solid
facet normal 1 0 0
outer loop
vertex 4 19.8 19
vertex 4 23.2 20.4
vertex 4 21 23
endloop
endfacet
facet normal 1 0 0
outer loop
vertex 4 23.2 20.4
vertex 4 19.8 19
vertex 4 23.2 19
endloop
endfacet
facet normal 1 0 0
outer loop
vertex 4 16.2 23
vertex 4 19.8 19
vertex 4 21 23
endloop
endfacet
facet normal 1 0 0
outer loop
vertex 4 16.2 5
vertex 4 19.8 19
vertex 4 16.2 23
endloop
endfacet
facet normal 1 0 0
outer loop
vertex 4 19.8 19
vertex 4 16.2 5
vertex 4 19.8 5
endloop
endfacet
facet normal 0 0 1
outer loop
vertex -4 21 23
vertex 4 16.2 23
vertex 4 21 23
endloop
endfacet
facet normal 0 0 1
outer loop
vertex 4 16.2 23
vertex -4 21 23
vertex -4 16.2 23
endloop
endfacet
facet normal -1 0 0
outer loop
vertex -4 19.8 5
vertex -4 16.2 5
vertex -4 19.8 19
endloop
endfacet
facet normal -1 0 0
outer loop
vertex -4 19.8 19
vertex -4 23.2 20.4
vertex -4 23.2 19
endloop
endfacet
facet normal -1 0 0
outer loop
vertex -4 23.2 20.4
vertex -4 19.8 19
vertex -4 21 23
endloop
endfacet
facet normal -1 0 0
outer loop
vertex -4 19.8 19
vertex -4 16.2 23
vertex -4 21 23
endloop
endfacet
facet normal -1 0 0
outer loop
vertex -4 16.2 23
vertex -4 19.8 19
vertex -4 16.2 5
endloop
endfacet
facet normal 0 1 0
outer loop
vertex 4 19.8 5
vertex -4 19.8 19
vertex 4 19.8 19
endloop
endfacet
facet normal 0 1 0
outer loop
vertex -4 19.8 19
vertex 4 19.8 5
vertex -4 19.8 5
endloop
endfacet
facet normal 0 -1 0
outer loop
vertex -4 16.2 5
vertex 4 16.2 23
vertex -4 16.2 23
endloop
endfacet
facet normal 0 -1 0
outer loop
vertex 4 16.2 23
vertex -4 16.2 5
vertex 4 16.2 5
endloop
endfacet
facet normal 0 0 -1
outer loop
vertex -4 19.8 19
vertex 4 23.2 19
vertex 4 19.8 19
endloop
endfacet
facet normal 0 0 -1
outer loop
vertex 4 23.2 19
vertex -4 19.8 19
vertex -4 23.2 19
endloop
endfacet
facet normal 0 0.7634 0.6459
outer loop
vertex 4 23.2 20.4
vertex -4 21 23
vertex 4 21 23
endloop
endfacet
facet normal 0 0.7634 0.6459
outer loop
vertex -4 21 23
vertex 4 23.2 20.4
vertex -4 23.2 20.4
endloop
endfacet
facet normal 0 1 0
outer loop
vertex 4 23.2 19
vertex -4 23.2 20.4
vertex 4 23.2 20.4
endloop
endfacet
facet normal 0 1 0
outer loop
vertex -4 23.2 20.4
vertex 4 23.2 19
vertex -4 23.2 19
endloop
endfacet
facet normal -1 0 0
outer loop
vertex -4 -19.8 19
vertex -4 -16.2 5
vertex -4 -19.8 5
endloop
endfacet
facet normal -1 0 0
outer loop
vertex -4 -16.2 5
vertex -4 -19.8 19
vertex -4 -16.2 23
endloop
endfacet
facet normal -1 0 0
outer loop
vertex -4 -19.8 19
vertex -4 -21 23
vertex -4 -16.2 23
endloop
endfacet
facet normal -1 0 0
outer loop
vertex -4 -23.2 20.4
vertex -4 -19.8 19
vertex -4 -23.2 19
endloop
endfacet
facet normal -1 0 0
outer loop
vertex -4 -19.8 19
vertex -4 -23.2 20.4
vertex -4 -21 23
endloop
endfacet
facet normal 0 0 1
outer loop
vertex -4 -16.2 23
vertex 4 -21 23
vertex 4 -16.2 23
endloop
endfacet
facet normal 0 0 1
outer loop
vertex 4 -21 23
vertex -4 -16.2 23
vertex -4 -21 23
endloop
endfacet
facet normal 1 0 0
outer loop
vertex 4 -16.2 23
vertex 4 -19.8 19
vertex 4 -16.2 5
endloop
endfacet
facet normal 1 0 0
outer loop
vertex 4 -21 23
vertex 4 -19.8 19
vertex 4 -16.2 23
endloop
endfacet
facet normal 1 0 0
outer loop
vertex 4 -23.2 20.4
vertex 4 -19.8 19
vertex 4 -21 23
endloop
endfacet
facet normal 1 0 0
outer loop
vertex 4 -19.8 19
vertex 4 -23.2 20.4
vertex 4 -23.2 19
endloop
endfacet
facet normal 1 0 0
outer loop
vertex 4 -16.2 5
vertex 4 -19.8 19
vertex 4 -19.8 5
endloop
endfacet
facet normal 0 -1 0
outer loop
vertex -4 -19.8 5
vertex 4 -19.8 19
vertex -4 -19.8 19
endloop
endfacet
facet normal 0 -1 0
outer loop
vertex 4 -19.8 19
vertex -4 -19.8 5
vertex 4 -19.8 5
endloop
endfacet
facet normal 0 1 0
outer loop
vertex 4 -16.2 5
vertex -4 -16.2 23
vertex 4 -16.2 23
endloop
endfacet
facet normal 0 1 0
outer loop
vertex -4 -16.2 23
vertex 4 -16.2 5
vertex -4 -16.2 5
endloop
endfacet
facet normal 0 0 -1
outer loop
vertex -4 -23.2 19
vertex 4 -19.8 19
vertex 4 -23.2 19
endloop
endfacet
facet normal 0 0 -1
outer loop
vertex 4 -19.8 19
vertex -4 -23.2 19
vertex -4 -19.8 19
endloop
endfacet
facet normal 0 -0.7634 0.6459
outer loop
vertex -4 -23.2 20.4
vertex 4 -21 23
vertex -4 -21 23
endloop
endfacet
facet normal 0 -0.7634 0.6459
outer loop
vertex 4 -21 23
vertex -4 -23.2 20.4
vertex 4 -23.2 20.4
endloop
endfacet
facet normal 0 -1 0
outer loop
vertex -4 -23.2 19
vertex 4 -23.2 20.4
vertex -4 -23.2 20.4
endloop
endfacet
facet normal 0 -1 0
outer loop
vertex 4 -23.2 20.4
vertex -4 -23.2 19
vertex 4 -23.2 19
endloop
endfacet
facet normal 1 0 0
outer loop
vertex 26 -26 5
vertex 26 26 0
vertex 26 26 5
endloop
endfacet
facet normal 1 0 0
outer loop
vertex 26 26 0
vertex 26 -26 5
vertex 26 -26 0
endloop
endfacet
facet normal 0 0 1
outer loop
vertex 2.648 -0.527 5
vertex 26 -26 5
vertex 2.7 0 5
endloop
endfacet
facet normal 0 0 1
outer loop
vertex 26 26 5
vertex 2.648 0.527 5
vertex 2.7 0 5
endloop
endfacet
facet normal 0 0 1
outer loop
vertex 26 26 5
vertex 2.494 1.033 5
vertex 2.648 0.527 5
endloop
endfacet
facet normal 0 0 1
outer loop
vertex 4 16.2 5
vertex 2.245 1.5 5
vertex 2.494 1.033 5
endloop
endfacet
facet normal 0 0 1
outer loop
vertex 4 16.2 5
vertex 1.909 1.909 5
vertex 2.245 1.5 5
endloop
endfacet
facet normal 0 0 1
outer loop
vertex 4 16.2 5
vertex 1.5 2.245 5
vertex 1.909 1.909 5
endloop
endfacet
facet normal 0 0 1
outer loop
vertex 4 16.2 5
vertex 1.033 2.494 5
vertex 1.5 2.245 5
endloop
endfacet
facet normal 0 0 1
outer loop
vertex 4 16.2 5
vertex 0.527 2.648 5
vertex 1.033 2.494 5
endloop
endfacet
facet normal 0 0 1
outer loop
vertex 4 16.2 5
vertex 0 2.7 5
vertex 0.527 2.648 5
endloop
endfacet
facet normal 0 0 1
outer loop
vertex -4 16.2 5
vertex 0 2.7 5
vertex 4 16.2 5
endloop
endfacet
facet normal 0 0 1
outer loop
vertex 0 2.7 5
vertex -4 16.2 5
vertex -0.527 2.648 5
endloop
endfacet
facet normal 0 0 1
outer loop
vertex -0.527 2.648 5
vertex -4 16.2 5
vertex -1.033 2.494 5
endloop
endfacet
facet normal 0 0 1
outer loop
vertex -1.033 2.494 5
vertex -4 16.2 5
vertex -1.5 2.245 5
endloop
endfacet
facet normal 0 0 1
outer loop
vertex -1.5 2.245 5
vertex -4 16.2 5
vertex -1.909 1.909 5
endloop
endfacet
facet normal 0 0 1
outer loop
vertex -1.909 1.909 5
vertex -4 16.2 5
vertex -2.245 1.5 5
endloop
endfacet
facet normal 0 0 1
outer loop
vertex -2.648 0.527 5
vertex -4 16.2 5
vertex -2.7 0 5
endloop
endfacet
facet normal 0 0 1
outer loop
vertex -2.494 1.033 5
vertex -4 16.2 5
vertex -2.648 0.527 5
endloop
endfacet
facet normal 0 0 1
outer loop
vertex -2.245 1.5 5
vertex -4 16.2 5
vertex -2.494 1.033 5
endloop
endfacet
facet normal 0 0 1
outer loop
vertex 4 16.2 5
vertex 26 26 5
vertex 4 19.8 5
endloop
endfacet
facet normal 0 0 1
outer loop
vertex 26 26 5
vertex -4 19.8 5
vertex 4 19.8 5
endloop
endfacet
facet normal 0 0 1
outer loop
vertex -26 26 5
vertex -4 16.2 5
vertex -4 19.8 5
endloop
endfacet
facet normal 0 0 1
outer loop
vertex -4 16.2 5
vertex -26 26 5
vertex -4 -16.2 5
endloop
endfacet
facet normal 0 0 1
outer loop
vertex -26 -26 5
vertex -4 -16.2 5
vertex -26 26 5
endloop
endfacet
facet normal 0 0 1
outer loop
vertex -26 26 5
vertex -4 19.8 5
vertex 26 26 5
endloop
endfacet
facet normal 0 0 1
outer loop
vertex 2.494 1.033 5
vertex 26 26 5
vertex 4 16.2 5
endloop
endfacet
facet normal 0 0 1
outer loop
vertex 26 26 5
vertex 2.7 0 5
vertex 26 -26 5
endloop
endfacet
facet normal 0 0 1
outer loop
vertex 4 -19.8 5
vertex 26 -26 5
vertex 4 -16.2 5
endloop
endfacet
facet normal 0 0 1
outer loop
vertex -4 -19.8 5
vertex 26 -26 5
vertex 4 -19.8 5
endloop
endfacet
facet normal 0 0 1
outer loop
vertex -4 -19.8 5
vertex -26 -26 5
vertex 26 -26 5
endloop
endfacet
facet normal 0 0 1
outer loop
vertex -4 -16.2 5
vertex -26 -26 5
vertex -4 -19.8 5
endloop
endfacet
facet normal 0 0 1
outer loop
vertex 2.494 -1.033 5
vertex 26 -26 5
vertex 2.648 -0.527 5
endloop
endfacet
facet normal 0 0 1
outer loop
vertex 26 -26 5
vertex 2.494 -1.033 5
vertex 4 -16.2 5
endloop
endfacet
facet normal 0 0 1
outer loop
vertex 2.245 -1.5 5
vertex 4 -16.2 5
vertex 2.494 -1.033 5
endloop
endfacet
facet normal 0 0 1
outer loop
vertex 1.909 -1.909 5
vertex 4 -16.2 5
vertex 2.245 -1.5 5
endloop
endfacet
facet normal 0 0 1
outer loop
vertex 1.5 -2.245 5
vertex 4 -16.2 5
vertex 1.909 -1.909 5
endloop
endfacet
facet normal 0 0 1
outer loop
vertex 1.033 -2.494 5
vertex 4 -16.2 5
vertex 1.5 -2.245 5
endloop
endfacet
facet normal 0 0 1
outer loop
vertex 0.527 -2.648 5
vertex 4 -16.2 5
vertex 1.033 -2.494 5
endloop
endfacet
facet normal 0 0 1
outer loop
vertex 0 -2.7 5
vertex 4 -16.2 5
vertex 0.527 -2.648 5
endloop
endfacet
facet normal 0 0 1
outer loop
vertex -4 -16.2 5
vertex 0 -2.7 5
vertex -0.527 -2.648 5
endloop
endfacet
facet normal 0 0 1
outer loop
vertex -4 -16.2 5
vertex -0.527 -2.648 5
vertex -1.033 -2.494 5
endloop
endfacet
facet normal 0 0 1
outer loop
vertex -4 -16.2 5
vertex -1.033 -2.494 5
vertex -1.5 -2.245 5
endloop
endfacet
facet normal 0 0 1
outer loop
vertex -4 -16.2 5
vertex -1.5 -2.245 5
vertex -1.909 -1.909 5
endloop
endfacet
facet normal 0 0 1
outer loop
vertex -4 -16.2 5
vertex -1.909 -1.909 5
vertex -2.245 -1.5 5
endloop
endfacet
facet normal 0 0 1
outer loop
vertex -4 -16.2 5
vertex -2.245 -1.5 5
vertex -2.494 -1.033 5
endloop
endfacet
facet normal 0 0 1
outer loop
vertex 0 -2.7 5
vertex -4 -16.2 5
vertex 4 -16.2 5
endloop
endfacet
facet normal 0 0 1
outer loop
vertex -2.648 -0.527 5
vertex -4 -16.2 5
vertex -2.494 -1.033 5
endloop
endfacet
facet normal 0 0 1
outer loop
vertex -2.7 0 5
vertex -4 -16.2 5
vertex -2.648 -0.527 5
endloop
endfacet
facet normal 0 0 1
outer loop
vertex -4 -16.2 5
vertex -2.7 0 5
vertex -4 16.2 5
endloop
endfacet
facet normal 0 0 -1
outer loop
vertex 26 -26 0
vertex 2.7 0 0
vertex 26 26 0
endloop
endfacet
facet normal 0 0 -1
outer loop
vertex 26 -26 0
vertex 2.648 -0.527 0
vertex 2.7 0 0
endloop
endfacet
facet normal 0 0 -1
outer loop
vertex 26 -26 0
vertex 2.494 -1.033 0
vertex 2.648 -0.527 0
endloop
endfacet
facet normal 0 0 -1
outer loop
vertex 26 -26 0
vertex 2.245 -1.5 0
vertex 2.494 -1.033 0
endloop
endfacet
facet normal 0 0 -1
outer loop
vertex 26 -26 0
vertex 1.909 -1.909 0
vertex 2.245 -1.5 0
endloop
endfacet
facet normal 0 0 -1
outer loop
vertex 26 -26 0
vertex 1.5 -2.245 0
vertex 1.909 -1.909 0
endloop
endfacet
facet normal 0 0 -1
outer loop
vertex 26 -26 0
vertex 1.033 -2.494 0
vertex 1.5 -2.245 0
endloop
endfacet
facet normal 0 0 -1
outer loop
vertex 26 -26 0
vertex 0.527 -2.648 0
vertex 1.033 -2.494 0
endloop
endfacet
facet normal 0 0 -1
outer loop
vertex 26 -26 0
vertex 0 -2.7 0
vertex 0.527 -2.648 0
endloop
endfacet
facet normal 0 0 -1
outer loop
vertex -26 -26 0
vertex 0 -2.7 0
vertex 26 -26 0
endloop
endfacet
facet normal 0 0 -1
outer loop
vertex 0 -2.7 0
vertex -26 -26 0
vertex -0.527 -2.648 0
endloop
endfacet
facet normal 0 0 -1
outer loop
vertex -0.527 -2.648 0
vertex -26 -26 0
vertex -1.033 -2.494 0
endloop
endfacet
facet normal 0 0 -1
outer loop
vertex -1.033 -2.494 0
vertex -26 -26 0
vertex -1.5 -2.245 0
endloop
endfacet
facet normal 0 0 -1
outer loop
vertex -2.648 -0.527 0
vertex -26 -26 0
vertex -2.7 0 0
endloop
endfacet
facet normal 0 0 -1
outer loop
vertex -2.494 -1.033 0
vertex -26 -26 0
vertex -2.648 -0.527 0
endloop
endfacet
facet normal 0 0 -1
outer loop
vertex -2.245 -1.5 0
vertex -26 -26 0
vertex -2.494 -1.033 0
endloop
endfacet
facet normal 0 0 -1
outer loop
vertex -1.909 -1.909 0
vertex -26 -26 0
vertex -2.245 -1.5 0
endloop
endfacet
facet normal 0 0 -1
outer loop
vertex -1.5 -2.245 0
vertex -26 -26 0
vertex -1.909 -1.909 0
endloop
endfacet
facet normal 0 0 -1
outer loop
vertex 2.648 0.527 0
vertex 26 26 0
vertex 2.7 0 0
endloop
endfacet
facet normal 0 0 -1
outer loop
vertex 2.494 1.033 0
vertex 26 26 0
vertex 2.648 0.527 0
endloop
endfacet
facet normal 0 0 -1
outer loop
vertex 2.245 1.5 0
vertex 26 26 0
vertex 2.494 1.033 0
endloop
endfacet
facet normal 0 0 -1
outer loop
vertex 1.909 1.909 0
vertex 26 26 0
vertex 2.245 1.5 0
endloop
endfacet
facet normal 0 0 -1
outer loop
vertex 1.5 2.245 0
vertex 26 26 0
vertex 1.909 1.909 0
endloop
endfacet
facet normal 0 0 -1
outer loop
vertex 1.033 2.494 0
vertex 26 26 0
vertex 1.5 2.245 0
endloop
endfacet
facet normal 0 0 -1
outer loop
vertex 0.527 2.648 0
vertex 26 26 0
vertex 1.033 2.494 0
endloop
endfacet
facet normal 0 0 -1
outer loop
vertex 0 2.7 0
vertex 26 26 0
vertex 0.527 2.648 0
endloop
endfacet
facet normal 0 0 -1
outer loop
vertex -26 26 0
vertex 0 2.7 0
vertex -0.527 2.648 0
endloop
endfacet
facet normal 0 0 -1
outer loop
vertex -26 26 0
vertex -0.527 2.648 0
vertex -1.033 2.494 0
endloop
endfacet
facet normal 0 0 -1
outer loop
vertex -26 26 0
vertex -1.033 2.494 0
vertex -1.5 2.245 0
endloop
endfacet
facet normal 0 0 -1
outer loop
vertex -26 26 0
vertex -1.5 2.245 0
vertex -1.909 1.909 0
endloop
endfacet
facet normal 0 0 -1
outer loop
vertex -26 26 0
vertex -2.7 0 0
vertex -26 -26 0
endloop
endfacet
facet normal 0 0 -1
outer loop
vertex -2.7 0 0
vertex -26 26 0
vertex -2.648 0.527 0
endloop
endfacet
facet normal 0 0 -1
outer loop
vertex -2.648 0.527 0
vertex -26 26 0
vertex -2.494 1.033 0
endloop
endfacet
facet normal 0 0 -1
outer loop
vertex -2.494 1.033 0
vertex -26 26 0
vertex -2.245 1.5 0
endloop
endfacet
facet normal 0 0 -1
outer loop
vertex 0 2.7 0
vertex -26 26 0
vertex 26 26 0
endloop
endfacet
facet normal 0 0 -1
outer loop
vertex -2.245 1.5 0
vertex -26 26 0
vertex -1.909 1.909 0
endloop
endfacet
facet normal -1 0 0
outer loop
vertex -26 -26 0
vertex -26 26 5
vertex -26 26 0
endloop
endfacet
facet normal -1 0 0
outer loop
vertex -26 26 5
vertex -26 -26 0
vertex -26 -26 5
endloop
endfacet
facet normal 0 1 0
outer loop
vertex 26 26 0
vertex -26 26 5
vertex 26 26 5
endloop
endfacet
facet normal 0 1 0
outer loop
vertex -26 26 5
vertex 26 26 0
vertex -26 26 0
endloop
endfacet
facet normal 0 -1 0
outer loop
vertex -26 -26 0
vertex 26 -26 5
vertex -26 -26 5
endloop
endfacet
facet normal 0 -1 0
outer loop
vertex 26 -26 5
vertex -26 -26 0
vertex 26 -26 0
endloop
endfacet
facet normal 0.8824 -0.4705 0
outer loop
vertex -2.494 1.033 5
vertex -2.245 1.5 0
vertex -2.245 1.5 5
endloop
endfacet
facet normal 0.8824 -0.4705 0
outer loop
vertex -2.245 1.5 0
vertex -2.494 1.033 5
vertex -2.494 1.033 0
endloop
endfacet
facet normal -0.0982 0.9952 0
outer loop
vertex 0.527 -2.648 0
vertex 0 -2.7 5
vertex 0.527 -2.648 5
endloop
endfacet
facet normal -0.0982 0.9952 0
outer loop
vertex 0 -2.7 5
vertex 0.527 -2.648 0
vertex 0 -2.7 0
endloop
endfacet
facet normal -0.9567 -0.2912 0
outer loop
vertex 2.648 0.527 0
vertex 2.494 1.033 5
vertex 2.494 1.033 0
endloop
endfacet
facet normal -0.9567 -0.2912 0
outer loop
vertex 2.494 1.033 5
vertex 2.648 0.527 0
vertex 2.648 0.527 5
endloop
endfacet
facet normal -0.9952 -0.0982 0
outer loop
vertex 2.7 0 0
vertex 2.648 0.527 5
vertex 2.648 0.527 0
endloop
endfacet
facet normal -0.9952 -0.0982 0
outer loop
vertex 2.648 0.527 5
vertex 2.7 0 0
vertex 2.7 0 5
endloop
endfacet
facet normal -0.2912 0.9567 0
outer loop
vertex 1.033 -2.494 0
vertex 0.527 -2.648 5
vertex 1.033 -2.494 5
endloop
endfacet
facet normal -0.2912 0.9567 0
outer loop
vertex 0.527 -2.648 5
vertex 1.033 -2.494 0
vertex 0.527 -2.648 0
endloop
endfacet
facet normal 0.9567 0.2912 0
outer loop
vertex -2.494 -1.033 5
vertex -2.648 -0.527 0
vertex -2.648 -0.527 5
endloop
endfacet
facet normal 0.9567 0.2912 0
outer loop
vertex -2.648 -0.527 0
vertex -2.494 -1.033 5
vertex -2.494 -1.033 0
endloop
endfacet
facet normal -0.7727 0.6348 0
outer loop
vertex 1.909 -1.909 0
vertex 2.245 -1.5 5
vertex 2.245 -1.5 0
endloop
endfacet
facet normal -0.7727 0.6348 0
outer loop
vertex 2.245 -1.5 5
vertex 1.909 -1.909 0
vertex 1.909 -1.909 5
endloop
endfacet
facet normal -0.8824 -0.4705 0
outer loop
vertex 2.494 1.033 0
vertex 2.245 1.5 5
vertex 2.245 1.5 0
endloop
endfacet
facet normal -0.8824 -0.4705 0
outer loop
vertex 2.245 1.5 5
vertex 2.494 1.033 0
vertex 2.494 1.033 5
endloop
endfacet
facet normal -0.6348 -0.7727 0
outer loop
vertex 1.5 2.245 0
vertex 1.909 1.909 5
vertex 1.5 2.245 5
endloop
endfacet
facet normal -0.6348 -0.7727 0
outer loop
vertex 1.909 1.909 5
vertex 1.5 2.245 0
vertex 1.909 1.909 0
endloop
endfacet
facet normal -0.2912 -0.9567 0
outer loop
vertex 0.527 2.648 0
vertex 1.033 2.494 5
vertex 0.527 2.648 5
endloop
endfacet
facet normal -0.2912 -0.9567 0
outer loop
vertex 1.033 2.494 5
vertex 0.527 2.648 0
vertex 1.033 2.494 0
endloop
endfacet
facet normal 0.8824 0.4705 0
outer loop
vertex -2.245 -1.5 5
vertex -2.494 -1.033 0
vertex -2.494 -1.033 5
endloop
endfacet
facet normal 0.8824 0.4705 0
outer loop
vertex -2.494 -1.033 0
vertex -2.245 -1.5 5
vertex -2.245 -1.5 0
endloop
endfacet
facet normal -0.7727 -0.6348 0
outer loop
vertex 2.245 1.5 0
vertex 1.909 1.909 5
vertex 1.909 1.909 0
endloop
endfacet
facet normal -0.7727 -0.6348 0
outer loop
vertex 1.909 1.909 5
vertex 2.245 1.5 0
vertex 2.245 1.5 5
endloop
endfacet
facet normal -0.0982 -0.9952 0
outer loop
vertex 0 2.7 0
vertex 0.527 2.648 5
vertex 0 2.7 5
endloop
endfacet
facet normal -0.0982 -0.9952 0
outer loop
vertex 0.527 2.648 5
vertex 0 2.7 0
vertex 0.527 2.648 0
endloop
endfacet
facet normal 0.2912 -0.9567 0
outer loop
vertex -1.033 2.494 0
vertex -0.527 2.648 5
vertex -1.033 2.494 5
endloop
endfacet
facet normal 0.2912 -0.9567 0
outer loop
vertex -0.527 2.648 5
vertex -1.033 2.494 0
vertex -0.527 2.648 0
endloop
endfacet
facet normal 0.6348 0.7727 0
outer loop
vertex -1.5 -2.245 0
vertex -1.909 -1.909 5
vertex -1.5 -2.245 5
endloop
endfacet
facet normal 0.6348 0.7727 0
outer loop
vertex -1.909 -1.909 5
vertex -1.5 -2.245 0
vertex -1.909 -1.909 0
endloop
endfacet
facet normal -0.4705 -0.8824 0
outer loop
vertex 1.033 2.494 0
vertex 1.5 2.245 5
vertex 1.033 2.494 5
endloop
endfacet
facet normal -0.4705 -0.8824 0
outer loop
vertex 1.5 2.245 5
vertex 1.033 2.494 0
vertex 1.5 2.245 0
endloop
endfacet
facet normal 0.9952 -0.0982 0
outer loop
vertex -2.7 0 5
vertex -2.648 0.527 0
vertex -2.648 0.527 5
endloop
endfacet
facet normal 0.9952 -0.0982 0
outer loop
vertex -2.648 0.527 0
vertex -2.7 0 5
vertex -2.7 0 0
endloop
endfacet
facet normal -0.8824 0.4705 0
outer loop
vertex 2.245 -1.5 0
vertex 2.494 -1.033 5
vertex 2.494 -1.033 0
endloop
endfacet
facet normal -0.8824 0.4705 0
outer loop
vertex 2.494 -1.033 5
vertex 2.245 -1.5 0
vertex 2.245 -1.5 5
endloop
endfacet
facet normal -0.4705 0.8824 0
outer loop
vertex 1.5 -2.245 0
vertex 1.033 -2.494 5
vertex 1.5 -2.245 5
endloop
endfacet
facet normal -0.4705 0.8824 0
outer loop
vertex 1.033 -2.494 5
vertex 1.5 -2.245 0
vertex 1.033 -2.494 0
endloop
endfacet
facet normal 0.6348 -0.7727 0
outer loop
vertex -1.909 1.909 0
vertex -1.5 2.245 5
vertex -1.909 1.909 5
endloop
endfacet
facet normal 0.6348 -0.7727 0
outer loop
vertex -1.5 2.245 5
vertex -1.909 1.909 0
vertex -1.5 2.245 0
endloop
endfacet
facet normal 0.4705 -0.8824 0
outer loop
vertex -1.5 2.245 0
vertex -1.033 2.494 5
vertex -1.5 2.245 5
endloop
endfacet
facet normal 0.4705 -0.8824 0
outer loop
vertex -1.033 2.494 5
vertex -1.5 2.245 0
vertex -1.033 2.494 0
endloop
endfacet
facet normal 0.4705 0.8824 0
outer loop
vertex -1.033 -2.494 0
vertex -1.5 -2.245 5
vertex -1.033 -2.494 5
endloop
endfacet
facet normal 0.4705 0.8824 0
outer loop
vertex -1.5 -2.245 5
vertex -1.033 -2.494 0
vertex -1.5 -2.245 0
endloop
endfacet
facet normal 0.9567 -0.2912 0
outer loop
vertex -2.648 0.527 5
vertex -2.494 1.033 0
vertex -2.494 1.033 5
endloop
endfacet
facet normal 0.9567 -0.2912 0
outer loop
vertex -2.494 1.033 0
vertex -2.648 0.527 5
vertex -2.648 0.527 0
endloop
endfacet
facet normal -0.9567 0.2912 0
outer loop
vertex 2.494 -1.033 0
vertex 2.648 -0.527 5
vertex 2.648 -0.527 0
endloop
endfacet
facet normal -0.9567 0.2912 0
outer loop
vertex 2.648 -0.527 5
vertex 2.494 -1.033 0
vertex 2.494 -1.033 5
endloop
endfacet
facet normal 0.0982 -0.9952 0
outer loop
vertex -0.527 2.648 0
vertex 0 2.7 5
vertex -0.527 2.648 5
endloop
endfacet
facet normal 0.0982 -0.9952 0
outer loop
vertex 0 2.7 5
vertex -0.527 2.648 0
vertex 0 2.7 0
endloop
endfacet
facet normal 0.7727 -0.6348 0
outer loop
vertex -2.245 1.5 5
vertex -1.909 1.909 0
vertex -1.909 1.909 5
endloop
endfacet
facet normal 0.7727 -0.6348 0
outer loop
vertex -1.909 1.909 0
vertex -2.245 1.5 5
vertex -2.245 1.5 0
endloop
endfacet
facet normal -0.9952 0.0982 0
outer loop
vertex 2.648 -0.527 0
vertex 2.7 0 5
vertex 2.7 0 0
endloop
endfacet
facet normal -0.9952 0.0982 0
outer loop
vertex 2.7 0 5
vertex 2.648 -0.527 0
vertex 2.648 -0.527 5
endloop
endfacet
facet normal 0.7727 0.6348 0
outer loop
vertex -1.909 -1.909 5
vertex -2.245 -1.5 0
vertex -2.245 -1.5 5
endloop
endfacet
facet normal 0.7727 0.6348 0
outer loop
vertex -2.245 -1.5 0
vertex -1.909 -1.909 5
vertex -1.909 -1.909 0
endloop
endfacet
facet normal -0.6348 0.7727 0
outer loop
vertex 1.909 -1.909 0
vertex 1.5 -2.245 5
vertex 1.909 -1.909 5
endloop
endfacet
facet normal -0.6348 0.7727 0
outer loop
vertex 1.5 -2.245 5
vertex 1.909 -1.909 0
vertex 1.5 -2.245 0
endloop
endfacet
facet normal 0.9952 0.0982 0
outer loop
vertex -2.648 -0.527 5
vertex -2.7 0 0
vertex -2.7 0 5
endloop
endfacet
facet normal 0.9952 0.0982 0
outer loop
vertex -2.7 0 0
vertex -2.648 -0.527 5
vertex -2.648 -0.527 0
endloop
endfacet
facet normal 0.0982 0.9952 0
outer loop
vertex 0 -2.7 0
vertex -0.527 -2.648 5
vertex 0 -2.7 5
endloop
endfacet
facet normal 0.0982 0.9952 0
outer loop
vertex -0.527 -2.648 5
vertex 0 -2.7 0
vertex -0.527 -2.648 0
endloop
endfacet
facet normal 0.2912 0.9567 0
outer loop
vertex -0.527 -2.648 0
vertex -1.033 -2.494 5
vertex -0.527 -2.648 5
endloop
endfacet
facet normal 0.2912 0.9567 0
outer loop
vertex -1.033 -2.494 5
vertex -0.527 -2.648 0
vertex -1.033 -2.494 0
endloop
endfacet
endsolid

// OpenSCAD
$fn = 32;

// ----------------------------------------------------------------------
// Snap-fit latch: 2 arms, 18 mm tall, 3.6 mm undercut hooks
// ----------------------------------------------------------------------

// --- parameters (mm) ---
base_d = 52;              // base plate depth
base_h = 5;               // base plate thickness
span = 36;                // distance between opposite arms
arm_t = 3.6;              // arm thickness
arm_d = 8;                // arm width
height = 18;              // free arm length
head_len = 3.6;           // hook reach
head_h = 4;               // hook height
lead = 1.4;               // lead-in ramp thickness
bore_d = 5.4;             // base fixing bore
top_z = 23;               // height of the arm tips above the base

arms = 2;

difference() {
  union() {
    /* base plate, centred on the arm ring */
    translate([-26, -26, 0]) cube([base_d, base_d, base_h]);
    for (a = [0 : 360 / arms : 359]) rotate([0, 0, a]) {
    /* arm, sunk 0.5 mm into the base */
    translate([-arm_d / 2, span / 2 - arm_t / 2, base_h - 0.5]) cube([arm_d, arm_t, height + 0.5]);
    /* hook: a convex hull of a tall inner block and a thin outer lip
       gives a flat undercut below and a lead-in ramp on top */
    hull() {
      translate([-arm_d / 2, span / 2 + arm_t / 2 - 0.6, top_z - head_h]) cube([arm_d, lead + 0.4, head_h]);
      translate([-arm_d / 2, span / 2 + arm_t / 2 - 0.2, top_z - head_h]) cube([arm_d, head_len, lead]);
    }
    }
  }
  translate([0, 0, -2.5]) cylinder(h = base_h + 5, d = bore_d);
}
